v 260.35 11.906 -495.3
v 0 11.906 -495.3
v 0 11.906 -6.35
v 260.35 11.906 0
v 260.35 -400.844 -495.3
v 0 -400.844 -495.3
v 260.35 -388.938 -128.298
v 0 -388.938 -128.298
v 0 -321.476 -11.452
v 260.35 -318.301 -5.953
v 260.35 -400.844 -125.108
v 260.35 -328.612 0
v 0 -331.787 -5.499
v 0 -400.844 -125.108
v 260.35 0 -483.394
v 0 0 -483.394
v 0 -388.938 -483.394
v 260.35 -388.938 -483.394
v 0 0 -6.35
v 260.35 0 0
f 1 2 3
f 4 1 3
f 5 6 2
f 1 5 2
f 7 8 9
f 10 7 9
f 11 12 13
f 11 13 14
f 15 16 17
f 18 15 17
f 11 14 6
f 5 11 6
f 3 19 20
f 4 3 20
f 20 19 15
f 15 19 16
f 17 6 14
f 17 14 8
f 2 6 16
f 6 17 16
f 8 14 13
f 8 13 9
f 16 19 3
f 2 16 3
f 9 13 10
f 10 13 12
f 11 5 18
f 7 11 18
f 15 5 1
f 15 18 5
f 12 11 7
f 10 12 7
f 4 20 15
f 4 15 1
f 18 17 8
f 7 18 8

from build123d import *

# Parameters (mm, degrees)
F1_DEPTH = 260.35
F3_DEPTH = 11.90725
F5_DEPTH = 25.4


with BuildPart() as f1:
    # F0 (on Right) → F1 (new body)
    with BuildSketch(Plane.YZ):
        Polygon((11.90625, 0), (0, 0), (0, -483.39375), (-388.9375, -483.39375), (-388.9375, -128.2984649666), (-318.3013850362, -5.953125), (-328.6125, 0), (-400.84375, -125.1081948942), (-400.84375, -495.3), (11.90625, -495.3), align=None)
    extrude(amount=F1_DEPTH)

    # F2 (on Front) → F3 (cut, through all)
    with BuildSketch(Plane.XZ):
        Polygon((260.35, 0), (0, 0), (0, -6.35), align=None)
    extrude(amount=-F3_DEPTH, mode=Mode.SUBTRACT)

    # F4 (on face) → F5 (cut)
    with BuildSketch(Plane(origin=(0, -246.459375, 142.2933865006), x_dir=(1, 0, 0), z_dir=(0, -0.8660254038, 0.5))):
        Polygon((260.35, -164.30625), (0, -164.30625), (0, -170.65625), align=None)
    extrude(amount=-F5_DEPTH, mode=Mode.SUBTRACT)


solid = f1.part
